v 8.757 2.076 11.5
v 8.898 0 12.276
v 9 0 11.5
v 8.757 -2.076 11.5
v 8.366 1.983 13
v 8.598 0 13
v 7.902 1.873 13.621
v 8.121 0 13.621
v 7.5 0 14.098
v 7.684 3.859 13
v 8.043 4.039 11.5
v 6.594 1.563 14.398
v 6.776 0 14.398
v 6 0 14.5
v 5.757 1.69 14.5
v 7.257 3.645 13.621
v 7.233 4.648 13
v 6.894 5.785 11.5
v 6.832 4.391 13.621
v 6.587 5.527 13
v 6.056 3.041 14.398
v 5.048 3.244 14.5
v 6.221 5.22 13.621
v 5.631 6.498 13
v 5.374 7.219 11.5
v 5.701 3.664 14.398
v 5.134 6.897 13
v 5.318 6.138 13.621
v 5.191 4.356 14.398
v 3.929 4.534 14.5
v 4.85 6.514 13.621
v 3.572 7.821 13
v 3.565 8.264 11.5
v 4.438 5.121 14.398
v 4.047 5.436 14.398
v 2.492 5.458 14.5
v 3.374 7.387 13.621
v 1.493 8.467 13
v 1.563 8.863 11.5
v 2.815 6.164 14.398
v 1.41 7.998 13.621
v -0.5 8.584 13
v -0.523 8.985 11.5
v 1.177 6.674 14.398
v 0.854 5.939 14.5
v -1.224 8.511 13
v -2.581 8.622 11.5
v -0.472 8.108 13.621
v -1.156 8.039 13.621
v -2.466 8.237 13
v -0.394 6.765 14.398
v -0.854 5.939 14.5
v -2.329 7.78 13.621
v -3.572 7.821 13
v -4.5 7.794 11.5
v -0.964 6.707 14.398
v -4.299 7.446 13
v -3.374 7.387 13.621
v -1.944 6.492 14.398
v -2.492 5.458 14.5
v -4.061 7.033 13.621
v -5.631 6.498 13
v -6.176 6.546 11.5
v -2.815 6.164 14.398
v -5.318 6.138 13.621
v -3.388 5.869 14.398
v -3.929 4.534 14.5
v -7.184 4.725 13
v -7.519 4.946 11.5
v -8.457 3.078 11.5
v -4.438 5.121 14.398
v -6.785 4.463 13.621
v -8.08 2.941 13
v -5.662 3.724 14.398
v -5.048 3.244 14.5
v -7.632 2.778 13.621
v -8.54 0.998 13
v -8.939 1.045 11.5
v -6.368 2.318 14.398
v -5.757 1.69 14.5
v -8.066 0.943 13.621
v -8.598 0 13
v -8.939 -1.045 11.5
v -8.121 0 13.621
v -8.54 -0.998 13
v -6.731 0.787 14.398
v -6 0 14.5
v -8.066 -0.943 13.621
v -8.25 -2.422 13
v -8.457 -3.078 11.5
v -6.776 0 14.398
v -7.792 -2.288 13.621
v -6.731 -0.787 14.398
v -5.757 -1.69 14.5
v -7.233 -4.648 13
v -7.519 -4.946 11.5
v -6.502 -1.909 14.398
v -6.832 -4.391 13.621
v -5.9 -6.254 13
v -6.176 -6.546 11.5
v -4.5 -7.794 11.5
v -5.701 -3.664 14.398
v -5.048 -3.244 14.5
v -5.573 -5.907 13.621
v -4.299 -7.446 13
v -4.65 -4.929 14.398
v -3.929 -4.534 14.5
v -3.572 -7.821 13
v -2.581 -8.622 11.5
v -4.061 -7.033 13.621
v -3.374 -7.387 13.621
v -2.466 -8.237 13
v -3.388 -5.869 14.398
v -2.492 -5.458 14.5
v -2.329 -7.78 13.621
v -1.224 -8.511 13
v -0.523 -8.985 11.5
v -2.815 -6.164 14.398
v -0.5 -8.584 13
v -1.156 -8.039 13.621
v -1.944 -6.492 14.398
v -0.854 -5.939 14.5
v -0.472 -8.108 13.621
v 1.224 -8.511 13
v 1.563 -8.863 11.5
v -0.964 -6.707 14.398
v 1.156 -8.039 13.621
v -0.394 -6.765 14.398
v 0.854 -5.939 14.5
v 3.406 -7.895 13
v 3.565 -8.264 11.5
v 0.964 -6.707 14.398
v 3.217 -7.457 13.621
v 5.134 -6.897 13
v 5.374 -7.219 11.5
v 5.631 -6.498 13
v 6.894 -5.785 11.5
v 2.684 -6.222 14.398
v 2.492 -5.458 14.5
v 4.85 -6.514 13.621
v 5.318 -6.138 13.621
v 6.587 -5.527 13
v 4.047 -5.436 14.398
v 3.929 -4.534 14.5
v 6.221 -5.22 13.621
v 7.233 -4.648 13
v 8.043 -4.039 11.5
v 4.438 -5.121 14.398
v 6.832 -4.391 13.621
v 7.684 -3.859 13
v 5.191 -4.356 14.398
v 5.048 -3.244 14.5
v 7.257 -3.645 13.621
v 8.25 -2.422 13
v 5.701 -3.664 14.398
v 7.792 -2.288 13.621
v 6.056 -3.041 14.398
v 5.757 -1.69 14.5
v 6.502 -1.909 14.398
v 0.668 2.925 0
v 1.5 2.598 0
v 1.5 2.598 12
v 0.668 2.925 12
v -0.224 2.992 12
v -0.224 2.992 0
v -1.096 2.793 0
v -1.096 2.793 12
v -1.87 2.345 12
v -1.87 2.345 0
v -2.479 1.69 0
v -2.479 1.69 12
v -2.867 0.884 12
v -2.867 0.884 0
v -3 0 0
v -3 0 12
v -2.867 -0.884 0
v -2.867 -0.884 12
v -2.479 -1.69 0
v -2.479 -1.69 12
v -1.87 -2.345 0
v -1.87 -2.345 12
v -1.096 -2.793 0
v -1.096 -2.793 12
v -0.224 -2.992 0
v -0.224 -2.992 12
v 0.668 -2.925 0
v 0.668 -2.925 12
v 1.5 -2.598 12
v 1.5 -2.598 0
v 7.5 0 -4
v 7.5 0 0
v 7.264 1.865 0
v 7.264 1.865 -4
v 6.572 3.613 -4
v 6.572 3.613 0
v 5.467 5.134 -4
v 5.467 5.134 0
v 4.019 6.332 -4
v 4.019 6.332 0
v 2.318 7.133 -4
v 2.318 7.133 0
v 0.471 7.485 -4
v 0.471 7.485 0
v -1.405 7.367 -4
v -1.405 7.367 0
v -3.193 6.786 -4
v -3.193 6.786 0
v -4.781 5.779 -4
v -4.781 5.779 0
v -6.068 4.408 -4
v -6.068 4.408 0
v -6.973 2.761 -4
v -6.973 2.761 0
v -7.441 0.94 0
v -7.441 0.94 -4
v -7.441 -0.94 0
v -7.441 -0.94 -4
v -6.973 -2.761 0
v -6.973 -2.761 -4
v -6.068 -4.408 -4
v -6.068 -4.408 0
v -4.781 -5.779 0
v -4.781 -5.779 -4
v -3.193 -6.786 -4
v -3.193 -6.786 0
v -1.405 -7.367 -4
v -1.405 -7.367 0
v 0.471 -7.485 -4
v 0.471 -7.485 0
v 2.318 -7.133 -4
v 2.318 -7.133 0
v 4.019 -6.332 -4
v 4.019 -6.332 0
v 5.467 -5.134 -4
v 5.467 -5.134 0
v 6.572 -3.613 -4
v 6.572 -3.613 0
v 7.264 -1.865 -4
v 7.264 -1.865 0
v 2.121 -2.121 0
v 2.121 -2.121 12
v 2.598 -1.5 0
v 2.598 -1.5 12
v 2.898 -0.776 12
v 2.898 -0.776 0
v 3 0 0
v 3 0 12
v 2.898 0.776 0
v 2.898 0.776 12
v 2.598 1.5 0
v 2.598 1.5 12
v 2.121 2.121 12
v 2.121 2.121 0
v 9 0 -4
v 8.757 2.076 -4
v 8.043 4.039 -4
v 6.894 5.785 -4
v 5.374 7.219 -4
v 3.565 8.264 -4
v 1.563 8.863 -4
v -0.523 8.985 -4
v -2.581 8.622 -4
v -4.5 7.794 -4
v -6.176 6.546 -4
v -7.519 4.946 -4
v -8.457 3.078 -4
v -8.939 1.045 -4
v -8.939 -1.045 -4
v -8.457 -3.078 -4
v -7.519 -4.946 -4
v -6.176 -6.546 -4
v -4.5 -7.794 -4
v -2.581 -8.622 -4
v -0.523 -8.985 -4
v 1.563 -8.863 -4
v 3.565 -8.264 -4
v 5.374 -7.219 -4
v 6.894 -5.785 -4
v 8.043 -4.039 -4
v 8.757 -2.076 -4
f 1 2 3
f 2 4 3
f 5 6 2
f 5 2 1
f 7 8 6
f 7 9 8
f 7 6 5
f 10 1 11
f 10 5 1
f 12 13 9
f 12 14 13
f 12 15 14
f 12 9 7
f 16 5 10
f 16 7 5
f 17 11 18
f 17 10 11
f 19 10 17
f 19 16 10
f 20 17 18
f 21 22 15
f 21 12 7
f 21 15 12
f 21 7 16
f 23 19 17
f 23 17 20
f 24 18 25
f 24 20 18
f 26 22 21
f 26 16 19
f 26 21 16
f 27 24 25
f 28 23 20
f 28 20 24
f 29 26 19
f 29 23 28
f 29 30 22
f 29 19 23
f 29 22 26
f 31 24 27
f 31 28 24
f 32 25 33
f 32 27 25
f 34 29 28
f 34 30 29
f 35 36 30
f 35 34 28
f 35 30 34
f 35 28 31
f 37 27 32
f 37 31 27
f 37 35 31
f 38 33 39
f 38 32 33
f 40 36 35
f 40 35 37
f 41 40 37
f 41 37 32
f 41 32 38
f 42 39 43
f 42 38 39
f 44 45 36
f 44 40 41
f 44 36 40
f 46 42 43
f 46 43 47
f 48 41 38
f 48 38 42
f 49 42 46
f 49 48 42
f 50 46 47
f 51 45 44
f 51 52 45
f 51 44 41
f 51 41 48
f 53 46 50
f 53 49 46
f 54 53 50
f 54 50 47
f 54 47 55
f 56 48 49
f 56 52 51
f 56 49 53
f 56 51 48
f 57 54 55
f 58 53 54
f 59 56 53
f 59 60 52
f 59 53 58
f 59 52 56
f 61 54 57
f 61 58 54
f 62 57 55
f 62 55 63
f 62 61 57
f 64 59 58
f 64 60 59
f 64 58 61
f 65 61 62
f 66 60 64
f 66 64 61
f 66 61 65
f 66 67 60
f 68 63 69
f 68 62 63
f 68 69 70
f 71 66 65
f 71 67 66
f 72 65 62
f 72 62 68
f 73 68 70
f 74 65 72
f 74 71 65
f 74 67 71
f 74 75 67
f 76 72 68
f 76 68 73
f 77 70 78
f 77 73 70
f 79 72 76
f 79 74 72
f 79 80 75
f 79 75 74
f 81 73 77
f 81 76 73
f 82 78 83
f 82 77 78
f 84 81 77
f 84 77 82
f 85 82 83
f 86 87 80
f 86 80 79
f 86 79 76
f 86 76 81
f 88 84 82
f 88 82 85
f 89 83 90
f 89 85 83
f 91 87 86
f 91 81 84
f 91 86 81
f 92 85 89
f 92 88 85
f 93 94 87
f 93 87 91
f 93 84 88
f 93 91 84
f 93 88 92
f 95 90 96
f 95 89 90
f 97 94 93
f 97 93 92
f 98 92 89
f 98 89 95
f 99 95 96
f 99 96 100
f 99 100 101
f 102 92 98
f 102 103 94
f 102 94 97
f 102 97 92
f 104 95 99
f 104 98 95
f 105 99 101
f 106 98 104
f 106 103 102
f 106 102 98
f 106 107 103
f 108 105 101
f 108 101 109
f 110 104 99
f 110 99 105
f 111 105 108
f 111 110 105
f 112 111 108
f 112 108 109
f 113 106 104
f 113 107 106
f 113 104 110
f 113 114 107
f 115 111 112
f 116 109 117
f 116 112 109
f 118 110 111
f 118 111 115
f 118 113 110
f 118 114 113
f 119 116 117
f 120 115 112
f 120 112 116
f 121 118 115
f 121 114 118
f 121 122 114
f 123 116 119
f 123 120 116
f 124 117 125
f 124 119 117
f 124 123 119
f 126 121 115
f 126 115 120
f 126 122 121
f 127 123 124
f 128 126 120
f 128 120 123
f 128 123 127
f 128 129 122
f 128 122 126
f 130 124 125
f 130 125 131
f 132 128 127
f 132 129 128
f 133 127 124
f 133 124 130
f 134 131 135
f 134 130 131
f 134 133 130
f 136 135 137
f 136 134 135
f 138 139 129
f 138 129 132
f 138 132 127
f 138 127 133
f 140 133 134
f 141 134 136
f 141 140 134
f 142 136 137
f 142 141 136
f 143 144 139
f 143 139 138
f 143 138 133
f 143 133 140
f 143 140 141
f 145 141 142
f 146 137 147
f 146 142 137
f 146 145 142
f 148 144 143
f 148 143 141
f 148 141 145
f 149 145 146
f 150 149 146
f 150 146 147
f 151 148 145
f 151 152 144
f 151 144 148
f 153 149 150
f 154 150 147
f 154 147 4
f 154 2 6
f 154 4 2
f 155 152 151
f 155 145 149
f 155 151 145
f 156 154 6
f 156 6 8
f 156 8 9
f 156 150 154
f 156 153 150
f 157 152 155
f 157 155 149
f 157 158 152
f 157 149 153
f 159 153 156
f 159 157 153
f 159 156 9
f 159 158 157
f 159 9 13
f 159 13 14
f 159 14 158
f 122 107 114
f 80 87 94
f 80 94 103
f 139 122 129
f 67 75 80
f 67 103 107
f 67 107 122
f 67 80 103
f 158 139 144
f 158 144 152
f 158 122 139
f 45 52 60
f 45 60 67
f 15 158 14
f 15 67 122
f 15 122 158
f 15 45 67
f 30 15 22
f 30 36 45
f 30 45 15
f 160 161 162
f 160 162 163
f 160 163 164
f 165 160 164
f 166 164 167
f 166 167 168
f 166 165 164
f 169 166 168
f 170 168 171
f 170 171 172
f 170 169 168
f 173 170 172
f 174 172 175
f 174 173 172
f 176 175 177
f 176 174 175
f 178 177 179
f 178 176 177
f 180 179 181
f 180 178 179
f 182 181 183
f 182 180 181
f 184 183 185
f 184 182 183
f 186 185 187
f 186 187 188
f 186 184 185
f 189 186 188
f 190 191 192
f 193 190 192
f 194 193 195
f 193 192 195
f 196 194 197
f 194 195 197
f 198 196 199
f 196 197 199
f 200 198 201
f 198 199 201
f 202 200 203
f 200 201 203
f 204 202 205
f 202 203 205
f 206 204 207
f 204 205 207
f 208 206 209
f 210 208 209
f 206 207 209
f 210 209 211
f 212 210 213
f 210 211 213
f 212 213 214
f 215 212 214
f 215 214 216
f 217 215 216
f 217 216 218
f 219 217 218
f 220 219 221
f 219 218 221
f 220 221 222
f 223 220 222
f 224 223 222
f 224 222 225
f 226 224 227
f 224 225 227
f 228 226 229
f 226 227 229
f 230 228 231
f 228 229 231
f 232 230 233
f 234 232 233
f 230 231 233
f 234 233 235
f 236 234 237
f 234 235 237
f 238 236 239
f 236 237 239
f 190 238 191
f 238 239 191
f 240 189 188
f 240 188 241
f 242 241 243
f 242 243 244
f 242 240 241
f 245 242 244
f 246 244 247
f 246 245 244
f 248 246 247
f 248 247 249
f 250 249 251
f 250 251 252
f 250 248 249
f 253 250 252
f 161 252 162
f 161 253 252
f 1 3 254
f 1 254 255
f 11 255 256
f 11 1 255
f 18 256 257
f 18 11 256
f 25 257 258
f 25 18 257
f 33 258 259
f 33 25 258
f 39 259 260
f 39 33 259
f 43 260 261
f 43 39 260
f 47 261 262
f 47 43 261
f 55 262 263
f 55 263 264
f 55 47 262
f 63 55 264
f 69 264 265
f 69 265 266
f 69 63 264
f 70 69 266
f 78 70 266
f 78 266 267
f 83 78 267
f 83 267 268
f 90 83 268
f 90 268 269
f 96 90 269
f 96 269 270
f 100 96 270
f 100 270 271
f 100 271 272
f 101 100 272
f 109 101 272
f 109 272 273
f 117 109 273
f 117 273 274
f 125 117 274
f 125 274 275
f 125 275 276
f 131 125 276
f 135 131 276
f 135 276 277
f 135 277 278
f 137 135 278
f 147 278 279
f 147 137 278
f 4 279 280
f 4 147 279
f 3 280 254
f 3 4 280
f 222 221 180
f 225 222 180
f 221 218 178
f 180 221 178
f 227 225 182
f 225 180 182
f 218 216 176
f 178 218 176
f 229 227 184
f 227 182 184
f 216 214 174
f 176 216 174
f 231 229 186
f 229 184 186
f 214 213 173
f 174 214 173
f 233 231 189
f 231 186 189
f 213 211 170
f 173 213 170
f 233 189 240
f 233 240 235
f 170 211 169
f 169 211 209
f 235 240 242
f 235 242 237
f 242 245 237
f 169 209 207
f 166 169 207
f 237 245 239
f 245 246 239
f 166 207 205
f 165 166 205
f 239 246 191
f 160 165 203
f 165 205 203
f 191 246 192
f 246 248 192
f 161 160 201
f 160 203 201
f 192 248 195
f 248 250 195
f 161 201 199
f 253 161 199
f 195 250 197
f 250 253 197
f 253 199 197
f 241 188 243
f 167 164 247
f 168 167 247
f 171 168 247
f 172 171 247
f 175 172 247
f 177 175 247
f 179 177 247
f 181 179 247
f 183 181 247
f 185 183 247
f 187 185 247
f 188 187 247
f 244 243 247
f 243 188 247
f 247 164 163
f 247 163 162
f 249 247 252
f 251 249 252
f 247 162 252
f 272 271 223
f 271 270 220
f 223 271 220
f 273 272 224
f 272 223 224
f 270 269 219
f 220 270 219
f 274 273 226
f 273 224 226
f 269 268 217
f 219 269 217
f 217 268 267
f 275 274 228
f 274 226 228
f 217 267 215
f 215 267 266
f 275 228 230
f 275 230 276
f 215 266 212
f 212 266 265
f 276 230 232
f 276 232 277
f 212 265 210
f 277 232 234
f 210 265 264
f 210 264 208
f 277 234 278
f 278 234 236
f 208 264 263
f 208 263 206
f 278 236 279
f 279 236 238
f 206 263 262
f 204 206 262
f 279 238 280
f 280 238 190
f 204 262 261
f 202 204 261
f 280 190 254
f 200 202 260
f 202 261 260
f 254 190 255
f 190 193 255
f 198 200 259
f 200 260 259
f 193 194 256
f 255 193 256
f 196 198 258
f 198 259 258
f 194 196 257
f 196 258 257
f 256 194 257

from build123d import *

# Parameters (mm, degrees)
F0_R     = 9
F0_R_2   = 7.5
F1_DEPTH = 14.5
F2_DEPTH = 12
F3_DEPTH = 4
F4_R     = 3


with BuildPart() as f1:
    # F0 (on Top) → F1 (new body)
    with BuildSketch(Plane.XY):
        Circle(F0_R)
        Circle(F0_R_2, mode=Mode.SUBTRACT)
        Circle(F0_R_2)
        with BuildLine():
            ThreePointArc((1.5, 2.5980762114), (2.5980762114, 1.5), (3, 0))
            ThreePointArc((3, 0), (2.5980762114, -1.5), (1.5, -2.5980762114))
            ThreePointArc((1.5, -2.5980762114), (-3, 0), (1.5, 2.5980762114))
        make_face(mode=Mode.SUBTRACT)
        with BuildLine():
            Line((1.5, -2.5980762114), (1.5, 2.5980762114))
            ThreePointArc((1.5, 2.5980762114), (-3, 0), (1.5, -2.5980762114))
        make_face()
        with BuildLine():
            ThreePointArc((1.5, -2.5980762114), (2.5980762114, -1.5), (3, 0))
            ThreePointArc((3, 0), (2.5980762114, 1.5), (1.5, 2.5980762114))
            Line((1.5, 2.5980762114), (1.5, -2.5980762114))
        make_face()
    extrude(amount=F1_DEPTH)

    # F0 (on Top) → F2 (cut)
    with BuildSketch(Plane.XY):
        with BuildLine():
            Line((1.5, -2.5980762114), (1.5, 2.5980762114))
            ThreePointArc((1.5, 2.5980762114), (-3, 0), (1.5, -2.5980762114))
        make_face()
        with BuildLine():
            ThreePointArc((1.5, -2.5980762114), (2.5980762114, -1.5), (3, 0))
            ThreePointArc((3, 0), (2.5980762114, 1.5), (1.5, 2.5980762114))
            Line((1.5, 2.5980762114), (1.5, -2.5980762114))
        make_face()
    extrude(amount=F2_DEPTH, mode=Mode.SUBTRACT)

    # F0 (on Top) → F3 (join)
    with BuildSketch(Plane.XY):
        Circle(F0_R)
        Circle(F0_R_2, mode=Mode.SUBTRACT)
    extrude(amount=-F3_DEPTH)

    # F4
    f4_edges = [f1.edges().sort_by_distance(p)[0] for p in [
        (-9, 0, 14.5),
    ]]
    fillet(f4_edges, radius=F4_R)


solid = f1.part
